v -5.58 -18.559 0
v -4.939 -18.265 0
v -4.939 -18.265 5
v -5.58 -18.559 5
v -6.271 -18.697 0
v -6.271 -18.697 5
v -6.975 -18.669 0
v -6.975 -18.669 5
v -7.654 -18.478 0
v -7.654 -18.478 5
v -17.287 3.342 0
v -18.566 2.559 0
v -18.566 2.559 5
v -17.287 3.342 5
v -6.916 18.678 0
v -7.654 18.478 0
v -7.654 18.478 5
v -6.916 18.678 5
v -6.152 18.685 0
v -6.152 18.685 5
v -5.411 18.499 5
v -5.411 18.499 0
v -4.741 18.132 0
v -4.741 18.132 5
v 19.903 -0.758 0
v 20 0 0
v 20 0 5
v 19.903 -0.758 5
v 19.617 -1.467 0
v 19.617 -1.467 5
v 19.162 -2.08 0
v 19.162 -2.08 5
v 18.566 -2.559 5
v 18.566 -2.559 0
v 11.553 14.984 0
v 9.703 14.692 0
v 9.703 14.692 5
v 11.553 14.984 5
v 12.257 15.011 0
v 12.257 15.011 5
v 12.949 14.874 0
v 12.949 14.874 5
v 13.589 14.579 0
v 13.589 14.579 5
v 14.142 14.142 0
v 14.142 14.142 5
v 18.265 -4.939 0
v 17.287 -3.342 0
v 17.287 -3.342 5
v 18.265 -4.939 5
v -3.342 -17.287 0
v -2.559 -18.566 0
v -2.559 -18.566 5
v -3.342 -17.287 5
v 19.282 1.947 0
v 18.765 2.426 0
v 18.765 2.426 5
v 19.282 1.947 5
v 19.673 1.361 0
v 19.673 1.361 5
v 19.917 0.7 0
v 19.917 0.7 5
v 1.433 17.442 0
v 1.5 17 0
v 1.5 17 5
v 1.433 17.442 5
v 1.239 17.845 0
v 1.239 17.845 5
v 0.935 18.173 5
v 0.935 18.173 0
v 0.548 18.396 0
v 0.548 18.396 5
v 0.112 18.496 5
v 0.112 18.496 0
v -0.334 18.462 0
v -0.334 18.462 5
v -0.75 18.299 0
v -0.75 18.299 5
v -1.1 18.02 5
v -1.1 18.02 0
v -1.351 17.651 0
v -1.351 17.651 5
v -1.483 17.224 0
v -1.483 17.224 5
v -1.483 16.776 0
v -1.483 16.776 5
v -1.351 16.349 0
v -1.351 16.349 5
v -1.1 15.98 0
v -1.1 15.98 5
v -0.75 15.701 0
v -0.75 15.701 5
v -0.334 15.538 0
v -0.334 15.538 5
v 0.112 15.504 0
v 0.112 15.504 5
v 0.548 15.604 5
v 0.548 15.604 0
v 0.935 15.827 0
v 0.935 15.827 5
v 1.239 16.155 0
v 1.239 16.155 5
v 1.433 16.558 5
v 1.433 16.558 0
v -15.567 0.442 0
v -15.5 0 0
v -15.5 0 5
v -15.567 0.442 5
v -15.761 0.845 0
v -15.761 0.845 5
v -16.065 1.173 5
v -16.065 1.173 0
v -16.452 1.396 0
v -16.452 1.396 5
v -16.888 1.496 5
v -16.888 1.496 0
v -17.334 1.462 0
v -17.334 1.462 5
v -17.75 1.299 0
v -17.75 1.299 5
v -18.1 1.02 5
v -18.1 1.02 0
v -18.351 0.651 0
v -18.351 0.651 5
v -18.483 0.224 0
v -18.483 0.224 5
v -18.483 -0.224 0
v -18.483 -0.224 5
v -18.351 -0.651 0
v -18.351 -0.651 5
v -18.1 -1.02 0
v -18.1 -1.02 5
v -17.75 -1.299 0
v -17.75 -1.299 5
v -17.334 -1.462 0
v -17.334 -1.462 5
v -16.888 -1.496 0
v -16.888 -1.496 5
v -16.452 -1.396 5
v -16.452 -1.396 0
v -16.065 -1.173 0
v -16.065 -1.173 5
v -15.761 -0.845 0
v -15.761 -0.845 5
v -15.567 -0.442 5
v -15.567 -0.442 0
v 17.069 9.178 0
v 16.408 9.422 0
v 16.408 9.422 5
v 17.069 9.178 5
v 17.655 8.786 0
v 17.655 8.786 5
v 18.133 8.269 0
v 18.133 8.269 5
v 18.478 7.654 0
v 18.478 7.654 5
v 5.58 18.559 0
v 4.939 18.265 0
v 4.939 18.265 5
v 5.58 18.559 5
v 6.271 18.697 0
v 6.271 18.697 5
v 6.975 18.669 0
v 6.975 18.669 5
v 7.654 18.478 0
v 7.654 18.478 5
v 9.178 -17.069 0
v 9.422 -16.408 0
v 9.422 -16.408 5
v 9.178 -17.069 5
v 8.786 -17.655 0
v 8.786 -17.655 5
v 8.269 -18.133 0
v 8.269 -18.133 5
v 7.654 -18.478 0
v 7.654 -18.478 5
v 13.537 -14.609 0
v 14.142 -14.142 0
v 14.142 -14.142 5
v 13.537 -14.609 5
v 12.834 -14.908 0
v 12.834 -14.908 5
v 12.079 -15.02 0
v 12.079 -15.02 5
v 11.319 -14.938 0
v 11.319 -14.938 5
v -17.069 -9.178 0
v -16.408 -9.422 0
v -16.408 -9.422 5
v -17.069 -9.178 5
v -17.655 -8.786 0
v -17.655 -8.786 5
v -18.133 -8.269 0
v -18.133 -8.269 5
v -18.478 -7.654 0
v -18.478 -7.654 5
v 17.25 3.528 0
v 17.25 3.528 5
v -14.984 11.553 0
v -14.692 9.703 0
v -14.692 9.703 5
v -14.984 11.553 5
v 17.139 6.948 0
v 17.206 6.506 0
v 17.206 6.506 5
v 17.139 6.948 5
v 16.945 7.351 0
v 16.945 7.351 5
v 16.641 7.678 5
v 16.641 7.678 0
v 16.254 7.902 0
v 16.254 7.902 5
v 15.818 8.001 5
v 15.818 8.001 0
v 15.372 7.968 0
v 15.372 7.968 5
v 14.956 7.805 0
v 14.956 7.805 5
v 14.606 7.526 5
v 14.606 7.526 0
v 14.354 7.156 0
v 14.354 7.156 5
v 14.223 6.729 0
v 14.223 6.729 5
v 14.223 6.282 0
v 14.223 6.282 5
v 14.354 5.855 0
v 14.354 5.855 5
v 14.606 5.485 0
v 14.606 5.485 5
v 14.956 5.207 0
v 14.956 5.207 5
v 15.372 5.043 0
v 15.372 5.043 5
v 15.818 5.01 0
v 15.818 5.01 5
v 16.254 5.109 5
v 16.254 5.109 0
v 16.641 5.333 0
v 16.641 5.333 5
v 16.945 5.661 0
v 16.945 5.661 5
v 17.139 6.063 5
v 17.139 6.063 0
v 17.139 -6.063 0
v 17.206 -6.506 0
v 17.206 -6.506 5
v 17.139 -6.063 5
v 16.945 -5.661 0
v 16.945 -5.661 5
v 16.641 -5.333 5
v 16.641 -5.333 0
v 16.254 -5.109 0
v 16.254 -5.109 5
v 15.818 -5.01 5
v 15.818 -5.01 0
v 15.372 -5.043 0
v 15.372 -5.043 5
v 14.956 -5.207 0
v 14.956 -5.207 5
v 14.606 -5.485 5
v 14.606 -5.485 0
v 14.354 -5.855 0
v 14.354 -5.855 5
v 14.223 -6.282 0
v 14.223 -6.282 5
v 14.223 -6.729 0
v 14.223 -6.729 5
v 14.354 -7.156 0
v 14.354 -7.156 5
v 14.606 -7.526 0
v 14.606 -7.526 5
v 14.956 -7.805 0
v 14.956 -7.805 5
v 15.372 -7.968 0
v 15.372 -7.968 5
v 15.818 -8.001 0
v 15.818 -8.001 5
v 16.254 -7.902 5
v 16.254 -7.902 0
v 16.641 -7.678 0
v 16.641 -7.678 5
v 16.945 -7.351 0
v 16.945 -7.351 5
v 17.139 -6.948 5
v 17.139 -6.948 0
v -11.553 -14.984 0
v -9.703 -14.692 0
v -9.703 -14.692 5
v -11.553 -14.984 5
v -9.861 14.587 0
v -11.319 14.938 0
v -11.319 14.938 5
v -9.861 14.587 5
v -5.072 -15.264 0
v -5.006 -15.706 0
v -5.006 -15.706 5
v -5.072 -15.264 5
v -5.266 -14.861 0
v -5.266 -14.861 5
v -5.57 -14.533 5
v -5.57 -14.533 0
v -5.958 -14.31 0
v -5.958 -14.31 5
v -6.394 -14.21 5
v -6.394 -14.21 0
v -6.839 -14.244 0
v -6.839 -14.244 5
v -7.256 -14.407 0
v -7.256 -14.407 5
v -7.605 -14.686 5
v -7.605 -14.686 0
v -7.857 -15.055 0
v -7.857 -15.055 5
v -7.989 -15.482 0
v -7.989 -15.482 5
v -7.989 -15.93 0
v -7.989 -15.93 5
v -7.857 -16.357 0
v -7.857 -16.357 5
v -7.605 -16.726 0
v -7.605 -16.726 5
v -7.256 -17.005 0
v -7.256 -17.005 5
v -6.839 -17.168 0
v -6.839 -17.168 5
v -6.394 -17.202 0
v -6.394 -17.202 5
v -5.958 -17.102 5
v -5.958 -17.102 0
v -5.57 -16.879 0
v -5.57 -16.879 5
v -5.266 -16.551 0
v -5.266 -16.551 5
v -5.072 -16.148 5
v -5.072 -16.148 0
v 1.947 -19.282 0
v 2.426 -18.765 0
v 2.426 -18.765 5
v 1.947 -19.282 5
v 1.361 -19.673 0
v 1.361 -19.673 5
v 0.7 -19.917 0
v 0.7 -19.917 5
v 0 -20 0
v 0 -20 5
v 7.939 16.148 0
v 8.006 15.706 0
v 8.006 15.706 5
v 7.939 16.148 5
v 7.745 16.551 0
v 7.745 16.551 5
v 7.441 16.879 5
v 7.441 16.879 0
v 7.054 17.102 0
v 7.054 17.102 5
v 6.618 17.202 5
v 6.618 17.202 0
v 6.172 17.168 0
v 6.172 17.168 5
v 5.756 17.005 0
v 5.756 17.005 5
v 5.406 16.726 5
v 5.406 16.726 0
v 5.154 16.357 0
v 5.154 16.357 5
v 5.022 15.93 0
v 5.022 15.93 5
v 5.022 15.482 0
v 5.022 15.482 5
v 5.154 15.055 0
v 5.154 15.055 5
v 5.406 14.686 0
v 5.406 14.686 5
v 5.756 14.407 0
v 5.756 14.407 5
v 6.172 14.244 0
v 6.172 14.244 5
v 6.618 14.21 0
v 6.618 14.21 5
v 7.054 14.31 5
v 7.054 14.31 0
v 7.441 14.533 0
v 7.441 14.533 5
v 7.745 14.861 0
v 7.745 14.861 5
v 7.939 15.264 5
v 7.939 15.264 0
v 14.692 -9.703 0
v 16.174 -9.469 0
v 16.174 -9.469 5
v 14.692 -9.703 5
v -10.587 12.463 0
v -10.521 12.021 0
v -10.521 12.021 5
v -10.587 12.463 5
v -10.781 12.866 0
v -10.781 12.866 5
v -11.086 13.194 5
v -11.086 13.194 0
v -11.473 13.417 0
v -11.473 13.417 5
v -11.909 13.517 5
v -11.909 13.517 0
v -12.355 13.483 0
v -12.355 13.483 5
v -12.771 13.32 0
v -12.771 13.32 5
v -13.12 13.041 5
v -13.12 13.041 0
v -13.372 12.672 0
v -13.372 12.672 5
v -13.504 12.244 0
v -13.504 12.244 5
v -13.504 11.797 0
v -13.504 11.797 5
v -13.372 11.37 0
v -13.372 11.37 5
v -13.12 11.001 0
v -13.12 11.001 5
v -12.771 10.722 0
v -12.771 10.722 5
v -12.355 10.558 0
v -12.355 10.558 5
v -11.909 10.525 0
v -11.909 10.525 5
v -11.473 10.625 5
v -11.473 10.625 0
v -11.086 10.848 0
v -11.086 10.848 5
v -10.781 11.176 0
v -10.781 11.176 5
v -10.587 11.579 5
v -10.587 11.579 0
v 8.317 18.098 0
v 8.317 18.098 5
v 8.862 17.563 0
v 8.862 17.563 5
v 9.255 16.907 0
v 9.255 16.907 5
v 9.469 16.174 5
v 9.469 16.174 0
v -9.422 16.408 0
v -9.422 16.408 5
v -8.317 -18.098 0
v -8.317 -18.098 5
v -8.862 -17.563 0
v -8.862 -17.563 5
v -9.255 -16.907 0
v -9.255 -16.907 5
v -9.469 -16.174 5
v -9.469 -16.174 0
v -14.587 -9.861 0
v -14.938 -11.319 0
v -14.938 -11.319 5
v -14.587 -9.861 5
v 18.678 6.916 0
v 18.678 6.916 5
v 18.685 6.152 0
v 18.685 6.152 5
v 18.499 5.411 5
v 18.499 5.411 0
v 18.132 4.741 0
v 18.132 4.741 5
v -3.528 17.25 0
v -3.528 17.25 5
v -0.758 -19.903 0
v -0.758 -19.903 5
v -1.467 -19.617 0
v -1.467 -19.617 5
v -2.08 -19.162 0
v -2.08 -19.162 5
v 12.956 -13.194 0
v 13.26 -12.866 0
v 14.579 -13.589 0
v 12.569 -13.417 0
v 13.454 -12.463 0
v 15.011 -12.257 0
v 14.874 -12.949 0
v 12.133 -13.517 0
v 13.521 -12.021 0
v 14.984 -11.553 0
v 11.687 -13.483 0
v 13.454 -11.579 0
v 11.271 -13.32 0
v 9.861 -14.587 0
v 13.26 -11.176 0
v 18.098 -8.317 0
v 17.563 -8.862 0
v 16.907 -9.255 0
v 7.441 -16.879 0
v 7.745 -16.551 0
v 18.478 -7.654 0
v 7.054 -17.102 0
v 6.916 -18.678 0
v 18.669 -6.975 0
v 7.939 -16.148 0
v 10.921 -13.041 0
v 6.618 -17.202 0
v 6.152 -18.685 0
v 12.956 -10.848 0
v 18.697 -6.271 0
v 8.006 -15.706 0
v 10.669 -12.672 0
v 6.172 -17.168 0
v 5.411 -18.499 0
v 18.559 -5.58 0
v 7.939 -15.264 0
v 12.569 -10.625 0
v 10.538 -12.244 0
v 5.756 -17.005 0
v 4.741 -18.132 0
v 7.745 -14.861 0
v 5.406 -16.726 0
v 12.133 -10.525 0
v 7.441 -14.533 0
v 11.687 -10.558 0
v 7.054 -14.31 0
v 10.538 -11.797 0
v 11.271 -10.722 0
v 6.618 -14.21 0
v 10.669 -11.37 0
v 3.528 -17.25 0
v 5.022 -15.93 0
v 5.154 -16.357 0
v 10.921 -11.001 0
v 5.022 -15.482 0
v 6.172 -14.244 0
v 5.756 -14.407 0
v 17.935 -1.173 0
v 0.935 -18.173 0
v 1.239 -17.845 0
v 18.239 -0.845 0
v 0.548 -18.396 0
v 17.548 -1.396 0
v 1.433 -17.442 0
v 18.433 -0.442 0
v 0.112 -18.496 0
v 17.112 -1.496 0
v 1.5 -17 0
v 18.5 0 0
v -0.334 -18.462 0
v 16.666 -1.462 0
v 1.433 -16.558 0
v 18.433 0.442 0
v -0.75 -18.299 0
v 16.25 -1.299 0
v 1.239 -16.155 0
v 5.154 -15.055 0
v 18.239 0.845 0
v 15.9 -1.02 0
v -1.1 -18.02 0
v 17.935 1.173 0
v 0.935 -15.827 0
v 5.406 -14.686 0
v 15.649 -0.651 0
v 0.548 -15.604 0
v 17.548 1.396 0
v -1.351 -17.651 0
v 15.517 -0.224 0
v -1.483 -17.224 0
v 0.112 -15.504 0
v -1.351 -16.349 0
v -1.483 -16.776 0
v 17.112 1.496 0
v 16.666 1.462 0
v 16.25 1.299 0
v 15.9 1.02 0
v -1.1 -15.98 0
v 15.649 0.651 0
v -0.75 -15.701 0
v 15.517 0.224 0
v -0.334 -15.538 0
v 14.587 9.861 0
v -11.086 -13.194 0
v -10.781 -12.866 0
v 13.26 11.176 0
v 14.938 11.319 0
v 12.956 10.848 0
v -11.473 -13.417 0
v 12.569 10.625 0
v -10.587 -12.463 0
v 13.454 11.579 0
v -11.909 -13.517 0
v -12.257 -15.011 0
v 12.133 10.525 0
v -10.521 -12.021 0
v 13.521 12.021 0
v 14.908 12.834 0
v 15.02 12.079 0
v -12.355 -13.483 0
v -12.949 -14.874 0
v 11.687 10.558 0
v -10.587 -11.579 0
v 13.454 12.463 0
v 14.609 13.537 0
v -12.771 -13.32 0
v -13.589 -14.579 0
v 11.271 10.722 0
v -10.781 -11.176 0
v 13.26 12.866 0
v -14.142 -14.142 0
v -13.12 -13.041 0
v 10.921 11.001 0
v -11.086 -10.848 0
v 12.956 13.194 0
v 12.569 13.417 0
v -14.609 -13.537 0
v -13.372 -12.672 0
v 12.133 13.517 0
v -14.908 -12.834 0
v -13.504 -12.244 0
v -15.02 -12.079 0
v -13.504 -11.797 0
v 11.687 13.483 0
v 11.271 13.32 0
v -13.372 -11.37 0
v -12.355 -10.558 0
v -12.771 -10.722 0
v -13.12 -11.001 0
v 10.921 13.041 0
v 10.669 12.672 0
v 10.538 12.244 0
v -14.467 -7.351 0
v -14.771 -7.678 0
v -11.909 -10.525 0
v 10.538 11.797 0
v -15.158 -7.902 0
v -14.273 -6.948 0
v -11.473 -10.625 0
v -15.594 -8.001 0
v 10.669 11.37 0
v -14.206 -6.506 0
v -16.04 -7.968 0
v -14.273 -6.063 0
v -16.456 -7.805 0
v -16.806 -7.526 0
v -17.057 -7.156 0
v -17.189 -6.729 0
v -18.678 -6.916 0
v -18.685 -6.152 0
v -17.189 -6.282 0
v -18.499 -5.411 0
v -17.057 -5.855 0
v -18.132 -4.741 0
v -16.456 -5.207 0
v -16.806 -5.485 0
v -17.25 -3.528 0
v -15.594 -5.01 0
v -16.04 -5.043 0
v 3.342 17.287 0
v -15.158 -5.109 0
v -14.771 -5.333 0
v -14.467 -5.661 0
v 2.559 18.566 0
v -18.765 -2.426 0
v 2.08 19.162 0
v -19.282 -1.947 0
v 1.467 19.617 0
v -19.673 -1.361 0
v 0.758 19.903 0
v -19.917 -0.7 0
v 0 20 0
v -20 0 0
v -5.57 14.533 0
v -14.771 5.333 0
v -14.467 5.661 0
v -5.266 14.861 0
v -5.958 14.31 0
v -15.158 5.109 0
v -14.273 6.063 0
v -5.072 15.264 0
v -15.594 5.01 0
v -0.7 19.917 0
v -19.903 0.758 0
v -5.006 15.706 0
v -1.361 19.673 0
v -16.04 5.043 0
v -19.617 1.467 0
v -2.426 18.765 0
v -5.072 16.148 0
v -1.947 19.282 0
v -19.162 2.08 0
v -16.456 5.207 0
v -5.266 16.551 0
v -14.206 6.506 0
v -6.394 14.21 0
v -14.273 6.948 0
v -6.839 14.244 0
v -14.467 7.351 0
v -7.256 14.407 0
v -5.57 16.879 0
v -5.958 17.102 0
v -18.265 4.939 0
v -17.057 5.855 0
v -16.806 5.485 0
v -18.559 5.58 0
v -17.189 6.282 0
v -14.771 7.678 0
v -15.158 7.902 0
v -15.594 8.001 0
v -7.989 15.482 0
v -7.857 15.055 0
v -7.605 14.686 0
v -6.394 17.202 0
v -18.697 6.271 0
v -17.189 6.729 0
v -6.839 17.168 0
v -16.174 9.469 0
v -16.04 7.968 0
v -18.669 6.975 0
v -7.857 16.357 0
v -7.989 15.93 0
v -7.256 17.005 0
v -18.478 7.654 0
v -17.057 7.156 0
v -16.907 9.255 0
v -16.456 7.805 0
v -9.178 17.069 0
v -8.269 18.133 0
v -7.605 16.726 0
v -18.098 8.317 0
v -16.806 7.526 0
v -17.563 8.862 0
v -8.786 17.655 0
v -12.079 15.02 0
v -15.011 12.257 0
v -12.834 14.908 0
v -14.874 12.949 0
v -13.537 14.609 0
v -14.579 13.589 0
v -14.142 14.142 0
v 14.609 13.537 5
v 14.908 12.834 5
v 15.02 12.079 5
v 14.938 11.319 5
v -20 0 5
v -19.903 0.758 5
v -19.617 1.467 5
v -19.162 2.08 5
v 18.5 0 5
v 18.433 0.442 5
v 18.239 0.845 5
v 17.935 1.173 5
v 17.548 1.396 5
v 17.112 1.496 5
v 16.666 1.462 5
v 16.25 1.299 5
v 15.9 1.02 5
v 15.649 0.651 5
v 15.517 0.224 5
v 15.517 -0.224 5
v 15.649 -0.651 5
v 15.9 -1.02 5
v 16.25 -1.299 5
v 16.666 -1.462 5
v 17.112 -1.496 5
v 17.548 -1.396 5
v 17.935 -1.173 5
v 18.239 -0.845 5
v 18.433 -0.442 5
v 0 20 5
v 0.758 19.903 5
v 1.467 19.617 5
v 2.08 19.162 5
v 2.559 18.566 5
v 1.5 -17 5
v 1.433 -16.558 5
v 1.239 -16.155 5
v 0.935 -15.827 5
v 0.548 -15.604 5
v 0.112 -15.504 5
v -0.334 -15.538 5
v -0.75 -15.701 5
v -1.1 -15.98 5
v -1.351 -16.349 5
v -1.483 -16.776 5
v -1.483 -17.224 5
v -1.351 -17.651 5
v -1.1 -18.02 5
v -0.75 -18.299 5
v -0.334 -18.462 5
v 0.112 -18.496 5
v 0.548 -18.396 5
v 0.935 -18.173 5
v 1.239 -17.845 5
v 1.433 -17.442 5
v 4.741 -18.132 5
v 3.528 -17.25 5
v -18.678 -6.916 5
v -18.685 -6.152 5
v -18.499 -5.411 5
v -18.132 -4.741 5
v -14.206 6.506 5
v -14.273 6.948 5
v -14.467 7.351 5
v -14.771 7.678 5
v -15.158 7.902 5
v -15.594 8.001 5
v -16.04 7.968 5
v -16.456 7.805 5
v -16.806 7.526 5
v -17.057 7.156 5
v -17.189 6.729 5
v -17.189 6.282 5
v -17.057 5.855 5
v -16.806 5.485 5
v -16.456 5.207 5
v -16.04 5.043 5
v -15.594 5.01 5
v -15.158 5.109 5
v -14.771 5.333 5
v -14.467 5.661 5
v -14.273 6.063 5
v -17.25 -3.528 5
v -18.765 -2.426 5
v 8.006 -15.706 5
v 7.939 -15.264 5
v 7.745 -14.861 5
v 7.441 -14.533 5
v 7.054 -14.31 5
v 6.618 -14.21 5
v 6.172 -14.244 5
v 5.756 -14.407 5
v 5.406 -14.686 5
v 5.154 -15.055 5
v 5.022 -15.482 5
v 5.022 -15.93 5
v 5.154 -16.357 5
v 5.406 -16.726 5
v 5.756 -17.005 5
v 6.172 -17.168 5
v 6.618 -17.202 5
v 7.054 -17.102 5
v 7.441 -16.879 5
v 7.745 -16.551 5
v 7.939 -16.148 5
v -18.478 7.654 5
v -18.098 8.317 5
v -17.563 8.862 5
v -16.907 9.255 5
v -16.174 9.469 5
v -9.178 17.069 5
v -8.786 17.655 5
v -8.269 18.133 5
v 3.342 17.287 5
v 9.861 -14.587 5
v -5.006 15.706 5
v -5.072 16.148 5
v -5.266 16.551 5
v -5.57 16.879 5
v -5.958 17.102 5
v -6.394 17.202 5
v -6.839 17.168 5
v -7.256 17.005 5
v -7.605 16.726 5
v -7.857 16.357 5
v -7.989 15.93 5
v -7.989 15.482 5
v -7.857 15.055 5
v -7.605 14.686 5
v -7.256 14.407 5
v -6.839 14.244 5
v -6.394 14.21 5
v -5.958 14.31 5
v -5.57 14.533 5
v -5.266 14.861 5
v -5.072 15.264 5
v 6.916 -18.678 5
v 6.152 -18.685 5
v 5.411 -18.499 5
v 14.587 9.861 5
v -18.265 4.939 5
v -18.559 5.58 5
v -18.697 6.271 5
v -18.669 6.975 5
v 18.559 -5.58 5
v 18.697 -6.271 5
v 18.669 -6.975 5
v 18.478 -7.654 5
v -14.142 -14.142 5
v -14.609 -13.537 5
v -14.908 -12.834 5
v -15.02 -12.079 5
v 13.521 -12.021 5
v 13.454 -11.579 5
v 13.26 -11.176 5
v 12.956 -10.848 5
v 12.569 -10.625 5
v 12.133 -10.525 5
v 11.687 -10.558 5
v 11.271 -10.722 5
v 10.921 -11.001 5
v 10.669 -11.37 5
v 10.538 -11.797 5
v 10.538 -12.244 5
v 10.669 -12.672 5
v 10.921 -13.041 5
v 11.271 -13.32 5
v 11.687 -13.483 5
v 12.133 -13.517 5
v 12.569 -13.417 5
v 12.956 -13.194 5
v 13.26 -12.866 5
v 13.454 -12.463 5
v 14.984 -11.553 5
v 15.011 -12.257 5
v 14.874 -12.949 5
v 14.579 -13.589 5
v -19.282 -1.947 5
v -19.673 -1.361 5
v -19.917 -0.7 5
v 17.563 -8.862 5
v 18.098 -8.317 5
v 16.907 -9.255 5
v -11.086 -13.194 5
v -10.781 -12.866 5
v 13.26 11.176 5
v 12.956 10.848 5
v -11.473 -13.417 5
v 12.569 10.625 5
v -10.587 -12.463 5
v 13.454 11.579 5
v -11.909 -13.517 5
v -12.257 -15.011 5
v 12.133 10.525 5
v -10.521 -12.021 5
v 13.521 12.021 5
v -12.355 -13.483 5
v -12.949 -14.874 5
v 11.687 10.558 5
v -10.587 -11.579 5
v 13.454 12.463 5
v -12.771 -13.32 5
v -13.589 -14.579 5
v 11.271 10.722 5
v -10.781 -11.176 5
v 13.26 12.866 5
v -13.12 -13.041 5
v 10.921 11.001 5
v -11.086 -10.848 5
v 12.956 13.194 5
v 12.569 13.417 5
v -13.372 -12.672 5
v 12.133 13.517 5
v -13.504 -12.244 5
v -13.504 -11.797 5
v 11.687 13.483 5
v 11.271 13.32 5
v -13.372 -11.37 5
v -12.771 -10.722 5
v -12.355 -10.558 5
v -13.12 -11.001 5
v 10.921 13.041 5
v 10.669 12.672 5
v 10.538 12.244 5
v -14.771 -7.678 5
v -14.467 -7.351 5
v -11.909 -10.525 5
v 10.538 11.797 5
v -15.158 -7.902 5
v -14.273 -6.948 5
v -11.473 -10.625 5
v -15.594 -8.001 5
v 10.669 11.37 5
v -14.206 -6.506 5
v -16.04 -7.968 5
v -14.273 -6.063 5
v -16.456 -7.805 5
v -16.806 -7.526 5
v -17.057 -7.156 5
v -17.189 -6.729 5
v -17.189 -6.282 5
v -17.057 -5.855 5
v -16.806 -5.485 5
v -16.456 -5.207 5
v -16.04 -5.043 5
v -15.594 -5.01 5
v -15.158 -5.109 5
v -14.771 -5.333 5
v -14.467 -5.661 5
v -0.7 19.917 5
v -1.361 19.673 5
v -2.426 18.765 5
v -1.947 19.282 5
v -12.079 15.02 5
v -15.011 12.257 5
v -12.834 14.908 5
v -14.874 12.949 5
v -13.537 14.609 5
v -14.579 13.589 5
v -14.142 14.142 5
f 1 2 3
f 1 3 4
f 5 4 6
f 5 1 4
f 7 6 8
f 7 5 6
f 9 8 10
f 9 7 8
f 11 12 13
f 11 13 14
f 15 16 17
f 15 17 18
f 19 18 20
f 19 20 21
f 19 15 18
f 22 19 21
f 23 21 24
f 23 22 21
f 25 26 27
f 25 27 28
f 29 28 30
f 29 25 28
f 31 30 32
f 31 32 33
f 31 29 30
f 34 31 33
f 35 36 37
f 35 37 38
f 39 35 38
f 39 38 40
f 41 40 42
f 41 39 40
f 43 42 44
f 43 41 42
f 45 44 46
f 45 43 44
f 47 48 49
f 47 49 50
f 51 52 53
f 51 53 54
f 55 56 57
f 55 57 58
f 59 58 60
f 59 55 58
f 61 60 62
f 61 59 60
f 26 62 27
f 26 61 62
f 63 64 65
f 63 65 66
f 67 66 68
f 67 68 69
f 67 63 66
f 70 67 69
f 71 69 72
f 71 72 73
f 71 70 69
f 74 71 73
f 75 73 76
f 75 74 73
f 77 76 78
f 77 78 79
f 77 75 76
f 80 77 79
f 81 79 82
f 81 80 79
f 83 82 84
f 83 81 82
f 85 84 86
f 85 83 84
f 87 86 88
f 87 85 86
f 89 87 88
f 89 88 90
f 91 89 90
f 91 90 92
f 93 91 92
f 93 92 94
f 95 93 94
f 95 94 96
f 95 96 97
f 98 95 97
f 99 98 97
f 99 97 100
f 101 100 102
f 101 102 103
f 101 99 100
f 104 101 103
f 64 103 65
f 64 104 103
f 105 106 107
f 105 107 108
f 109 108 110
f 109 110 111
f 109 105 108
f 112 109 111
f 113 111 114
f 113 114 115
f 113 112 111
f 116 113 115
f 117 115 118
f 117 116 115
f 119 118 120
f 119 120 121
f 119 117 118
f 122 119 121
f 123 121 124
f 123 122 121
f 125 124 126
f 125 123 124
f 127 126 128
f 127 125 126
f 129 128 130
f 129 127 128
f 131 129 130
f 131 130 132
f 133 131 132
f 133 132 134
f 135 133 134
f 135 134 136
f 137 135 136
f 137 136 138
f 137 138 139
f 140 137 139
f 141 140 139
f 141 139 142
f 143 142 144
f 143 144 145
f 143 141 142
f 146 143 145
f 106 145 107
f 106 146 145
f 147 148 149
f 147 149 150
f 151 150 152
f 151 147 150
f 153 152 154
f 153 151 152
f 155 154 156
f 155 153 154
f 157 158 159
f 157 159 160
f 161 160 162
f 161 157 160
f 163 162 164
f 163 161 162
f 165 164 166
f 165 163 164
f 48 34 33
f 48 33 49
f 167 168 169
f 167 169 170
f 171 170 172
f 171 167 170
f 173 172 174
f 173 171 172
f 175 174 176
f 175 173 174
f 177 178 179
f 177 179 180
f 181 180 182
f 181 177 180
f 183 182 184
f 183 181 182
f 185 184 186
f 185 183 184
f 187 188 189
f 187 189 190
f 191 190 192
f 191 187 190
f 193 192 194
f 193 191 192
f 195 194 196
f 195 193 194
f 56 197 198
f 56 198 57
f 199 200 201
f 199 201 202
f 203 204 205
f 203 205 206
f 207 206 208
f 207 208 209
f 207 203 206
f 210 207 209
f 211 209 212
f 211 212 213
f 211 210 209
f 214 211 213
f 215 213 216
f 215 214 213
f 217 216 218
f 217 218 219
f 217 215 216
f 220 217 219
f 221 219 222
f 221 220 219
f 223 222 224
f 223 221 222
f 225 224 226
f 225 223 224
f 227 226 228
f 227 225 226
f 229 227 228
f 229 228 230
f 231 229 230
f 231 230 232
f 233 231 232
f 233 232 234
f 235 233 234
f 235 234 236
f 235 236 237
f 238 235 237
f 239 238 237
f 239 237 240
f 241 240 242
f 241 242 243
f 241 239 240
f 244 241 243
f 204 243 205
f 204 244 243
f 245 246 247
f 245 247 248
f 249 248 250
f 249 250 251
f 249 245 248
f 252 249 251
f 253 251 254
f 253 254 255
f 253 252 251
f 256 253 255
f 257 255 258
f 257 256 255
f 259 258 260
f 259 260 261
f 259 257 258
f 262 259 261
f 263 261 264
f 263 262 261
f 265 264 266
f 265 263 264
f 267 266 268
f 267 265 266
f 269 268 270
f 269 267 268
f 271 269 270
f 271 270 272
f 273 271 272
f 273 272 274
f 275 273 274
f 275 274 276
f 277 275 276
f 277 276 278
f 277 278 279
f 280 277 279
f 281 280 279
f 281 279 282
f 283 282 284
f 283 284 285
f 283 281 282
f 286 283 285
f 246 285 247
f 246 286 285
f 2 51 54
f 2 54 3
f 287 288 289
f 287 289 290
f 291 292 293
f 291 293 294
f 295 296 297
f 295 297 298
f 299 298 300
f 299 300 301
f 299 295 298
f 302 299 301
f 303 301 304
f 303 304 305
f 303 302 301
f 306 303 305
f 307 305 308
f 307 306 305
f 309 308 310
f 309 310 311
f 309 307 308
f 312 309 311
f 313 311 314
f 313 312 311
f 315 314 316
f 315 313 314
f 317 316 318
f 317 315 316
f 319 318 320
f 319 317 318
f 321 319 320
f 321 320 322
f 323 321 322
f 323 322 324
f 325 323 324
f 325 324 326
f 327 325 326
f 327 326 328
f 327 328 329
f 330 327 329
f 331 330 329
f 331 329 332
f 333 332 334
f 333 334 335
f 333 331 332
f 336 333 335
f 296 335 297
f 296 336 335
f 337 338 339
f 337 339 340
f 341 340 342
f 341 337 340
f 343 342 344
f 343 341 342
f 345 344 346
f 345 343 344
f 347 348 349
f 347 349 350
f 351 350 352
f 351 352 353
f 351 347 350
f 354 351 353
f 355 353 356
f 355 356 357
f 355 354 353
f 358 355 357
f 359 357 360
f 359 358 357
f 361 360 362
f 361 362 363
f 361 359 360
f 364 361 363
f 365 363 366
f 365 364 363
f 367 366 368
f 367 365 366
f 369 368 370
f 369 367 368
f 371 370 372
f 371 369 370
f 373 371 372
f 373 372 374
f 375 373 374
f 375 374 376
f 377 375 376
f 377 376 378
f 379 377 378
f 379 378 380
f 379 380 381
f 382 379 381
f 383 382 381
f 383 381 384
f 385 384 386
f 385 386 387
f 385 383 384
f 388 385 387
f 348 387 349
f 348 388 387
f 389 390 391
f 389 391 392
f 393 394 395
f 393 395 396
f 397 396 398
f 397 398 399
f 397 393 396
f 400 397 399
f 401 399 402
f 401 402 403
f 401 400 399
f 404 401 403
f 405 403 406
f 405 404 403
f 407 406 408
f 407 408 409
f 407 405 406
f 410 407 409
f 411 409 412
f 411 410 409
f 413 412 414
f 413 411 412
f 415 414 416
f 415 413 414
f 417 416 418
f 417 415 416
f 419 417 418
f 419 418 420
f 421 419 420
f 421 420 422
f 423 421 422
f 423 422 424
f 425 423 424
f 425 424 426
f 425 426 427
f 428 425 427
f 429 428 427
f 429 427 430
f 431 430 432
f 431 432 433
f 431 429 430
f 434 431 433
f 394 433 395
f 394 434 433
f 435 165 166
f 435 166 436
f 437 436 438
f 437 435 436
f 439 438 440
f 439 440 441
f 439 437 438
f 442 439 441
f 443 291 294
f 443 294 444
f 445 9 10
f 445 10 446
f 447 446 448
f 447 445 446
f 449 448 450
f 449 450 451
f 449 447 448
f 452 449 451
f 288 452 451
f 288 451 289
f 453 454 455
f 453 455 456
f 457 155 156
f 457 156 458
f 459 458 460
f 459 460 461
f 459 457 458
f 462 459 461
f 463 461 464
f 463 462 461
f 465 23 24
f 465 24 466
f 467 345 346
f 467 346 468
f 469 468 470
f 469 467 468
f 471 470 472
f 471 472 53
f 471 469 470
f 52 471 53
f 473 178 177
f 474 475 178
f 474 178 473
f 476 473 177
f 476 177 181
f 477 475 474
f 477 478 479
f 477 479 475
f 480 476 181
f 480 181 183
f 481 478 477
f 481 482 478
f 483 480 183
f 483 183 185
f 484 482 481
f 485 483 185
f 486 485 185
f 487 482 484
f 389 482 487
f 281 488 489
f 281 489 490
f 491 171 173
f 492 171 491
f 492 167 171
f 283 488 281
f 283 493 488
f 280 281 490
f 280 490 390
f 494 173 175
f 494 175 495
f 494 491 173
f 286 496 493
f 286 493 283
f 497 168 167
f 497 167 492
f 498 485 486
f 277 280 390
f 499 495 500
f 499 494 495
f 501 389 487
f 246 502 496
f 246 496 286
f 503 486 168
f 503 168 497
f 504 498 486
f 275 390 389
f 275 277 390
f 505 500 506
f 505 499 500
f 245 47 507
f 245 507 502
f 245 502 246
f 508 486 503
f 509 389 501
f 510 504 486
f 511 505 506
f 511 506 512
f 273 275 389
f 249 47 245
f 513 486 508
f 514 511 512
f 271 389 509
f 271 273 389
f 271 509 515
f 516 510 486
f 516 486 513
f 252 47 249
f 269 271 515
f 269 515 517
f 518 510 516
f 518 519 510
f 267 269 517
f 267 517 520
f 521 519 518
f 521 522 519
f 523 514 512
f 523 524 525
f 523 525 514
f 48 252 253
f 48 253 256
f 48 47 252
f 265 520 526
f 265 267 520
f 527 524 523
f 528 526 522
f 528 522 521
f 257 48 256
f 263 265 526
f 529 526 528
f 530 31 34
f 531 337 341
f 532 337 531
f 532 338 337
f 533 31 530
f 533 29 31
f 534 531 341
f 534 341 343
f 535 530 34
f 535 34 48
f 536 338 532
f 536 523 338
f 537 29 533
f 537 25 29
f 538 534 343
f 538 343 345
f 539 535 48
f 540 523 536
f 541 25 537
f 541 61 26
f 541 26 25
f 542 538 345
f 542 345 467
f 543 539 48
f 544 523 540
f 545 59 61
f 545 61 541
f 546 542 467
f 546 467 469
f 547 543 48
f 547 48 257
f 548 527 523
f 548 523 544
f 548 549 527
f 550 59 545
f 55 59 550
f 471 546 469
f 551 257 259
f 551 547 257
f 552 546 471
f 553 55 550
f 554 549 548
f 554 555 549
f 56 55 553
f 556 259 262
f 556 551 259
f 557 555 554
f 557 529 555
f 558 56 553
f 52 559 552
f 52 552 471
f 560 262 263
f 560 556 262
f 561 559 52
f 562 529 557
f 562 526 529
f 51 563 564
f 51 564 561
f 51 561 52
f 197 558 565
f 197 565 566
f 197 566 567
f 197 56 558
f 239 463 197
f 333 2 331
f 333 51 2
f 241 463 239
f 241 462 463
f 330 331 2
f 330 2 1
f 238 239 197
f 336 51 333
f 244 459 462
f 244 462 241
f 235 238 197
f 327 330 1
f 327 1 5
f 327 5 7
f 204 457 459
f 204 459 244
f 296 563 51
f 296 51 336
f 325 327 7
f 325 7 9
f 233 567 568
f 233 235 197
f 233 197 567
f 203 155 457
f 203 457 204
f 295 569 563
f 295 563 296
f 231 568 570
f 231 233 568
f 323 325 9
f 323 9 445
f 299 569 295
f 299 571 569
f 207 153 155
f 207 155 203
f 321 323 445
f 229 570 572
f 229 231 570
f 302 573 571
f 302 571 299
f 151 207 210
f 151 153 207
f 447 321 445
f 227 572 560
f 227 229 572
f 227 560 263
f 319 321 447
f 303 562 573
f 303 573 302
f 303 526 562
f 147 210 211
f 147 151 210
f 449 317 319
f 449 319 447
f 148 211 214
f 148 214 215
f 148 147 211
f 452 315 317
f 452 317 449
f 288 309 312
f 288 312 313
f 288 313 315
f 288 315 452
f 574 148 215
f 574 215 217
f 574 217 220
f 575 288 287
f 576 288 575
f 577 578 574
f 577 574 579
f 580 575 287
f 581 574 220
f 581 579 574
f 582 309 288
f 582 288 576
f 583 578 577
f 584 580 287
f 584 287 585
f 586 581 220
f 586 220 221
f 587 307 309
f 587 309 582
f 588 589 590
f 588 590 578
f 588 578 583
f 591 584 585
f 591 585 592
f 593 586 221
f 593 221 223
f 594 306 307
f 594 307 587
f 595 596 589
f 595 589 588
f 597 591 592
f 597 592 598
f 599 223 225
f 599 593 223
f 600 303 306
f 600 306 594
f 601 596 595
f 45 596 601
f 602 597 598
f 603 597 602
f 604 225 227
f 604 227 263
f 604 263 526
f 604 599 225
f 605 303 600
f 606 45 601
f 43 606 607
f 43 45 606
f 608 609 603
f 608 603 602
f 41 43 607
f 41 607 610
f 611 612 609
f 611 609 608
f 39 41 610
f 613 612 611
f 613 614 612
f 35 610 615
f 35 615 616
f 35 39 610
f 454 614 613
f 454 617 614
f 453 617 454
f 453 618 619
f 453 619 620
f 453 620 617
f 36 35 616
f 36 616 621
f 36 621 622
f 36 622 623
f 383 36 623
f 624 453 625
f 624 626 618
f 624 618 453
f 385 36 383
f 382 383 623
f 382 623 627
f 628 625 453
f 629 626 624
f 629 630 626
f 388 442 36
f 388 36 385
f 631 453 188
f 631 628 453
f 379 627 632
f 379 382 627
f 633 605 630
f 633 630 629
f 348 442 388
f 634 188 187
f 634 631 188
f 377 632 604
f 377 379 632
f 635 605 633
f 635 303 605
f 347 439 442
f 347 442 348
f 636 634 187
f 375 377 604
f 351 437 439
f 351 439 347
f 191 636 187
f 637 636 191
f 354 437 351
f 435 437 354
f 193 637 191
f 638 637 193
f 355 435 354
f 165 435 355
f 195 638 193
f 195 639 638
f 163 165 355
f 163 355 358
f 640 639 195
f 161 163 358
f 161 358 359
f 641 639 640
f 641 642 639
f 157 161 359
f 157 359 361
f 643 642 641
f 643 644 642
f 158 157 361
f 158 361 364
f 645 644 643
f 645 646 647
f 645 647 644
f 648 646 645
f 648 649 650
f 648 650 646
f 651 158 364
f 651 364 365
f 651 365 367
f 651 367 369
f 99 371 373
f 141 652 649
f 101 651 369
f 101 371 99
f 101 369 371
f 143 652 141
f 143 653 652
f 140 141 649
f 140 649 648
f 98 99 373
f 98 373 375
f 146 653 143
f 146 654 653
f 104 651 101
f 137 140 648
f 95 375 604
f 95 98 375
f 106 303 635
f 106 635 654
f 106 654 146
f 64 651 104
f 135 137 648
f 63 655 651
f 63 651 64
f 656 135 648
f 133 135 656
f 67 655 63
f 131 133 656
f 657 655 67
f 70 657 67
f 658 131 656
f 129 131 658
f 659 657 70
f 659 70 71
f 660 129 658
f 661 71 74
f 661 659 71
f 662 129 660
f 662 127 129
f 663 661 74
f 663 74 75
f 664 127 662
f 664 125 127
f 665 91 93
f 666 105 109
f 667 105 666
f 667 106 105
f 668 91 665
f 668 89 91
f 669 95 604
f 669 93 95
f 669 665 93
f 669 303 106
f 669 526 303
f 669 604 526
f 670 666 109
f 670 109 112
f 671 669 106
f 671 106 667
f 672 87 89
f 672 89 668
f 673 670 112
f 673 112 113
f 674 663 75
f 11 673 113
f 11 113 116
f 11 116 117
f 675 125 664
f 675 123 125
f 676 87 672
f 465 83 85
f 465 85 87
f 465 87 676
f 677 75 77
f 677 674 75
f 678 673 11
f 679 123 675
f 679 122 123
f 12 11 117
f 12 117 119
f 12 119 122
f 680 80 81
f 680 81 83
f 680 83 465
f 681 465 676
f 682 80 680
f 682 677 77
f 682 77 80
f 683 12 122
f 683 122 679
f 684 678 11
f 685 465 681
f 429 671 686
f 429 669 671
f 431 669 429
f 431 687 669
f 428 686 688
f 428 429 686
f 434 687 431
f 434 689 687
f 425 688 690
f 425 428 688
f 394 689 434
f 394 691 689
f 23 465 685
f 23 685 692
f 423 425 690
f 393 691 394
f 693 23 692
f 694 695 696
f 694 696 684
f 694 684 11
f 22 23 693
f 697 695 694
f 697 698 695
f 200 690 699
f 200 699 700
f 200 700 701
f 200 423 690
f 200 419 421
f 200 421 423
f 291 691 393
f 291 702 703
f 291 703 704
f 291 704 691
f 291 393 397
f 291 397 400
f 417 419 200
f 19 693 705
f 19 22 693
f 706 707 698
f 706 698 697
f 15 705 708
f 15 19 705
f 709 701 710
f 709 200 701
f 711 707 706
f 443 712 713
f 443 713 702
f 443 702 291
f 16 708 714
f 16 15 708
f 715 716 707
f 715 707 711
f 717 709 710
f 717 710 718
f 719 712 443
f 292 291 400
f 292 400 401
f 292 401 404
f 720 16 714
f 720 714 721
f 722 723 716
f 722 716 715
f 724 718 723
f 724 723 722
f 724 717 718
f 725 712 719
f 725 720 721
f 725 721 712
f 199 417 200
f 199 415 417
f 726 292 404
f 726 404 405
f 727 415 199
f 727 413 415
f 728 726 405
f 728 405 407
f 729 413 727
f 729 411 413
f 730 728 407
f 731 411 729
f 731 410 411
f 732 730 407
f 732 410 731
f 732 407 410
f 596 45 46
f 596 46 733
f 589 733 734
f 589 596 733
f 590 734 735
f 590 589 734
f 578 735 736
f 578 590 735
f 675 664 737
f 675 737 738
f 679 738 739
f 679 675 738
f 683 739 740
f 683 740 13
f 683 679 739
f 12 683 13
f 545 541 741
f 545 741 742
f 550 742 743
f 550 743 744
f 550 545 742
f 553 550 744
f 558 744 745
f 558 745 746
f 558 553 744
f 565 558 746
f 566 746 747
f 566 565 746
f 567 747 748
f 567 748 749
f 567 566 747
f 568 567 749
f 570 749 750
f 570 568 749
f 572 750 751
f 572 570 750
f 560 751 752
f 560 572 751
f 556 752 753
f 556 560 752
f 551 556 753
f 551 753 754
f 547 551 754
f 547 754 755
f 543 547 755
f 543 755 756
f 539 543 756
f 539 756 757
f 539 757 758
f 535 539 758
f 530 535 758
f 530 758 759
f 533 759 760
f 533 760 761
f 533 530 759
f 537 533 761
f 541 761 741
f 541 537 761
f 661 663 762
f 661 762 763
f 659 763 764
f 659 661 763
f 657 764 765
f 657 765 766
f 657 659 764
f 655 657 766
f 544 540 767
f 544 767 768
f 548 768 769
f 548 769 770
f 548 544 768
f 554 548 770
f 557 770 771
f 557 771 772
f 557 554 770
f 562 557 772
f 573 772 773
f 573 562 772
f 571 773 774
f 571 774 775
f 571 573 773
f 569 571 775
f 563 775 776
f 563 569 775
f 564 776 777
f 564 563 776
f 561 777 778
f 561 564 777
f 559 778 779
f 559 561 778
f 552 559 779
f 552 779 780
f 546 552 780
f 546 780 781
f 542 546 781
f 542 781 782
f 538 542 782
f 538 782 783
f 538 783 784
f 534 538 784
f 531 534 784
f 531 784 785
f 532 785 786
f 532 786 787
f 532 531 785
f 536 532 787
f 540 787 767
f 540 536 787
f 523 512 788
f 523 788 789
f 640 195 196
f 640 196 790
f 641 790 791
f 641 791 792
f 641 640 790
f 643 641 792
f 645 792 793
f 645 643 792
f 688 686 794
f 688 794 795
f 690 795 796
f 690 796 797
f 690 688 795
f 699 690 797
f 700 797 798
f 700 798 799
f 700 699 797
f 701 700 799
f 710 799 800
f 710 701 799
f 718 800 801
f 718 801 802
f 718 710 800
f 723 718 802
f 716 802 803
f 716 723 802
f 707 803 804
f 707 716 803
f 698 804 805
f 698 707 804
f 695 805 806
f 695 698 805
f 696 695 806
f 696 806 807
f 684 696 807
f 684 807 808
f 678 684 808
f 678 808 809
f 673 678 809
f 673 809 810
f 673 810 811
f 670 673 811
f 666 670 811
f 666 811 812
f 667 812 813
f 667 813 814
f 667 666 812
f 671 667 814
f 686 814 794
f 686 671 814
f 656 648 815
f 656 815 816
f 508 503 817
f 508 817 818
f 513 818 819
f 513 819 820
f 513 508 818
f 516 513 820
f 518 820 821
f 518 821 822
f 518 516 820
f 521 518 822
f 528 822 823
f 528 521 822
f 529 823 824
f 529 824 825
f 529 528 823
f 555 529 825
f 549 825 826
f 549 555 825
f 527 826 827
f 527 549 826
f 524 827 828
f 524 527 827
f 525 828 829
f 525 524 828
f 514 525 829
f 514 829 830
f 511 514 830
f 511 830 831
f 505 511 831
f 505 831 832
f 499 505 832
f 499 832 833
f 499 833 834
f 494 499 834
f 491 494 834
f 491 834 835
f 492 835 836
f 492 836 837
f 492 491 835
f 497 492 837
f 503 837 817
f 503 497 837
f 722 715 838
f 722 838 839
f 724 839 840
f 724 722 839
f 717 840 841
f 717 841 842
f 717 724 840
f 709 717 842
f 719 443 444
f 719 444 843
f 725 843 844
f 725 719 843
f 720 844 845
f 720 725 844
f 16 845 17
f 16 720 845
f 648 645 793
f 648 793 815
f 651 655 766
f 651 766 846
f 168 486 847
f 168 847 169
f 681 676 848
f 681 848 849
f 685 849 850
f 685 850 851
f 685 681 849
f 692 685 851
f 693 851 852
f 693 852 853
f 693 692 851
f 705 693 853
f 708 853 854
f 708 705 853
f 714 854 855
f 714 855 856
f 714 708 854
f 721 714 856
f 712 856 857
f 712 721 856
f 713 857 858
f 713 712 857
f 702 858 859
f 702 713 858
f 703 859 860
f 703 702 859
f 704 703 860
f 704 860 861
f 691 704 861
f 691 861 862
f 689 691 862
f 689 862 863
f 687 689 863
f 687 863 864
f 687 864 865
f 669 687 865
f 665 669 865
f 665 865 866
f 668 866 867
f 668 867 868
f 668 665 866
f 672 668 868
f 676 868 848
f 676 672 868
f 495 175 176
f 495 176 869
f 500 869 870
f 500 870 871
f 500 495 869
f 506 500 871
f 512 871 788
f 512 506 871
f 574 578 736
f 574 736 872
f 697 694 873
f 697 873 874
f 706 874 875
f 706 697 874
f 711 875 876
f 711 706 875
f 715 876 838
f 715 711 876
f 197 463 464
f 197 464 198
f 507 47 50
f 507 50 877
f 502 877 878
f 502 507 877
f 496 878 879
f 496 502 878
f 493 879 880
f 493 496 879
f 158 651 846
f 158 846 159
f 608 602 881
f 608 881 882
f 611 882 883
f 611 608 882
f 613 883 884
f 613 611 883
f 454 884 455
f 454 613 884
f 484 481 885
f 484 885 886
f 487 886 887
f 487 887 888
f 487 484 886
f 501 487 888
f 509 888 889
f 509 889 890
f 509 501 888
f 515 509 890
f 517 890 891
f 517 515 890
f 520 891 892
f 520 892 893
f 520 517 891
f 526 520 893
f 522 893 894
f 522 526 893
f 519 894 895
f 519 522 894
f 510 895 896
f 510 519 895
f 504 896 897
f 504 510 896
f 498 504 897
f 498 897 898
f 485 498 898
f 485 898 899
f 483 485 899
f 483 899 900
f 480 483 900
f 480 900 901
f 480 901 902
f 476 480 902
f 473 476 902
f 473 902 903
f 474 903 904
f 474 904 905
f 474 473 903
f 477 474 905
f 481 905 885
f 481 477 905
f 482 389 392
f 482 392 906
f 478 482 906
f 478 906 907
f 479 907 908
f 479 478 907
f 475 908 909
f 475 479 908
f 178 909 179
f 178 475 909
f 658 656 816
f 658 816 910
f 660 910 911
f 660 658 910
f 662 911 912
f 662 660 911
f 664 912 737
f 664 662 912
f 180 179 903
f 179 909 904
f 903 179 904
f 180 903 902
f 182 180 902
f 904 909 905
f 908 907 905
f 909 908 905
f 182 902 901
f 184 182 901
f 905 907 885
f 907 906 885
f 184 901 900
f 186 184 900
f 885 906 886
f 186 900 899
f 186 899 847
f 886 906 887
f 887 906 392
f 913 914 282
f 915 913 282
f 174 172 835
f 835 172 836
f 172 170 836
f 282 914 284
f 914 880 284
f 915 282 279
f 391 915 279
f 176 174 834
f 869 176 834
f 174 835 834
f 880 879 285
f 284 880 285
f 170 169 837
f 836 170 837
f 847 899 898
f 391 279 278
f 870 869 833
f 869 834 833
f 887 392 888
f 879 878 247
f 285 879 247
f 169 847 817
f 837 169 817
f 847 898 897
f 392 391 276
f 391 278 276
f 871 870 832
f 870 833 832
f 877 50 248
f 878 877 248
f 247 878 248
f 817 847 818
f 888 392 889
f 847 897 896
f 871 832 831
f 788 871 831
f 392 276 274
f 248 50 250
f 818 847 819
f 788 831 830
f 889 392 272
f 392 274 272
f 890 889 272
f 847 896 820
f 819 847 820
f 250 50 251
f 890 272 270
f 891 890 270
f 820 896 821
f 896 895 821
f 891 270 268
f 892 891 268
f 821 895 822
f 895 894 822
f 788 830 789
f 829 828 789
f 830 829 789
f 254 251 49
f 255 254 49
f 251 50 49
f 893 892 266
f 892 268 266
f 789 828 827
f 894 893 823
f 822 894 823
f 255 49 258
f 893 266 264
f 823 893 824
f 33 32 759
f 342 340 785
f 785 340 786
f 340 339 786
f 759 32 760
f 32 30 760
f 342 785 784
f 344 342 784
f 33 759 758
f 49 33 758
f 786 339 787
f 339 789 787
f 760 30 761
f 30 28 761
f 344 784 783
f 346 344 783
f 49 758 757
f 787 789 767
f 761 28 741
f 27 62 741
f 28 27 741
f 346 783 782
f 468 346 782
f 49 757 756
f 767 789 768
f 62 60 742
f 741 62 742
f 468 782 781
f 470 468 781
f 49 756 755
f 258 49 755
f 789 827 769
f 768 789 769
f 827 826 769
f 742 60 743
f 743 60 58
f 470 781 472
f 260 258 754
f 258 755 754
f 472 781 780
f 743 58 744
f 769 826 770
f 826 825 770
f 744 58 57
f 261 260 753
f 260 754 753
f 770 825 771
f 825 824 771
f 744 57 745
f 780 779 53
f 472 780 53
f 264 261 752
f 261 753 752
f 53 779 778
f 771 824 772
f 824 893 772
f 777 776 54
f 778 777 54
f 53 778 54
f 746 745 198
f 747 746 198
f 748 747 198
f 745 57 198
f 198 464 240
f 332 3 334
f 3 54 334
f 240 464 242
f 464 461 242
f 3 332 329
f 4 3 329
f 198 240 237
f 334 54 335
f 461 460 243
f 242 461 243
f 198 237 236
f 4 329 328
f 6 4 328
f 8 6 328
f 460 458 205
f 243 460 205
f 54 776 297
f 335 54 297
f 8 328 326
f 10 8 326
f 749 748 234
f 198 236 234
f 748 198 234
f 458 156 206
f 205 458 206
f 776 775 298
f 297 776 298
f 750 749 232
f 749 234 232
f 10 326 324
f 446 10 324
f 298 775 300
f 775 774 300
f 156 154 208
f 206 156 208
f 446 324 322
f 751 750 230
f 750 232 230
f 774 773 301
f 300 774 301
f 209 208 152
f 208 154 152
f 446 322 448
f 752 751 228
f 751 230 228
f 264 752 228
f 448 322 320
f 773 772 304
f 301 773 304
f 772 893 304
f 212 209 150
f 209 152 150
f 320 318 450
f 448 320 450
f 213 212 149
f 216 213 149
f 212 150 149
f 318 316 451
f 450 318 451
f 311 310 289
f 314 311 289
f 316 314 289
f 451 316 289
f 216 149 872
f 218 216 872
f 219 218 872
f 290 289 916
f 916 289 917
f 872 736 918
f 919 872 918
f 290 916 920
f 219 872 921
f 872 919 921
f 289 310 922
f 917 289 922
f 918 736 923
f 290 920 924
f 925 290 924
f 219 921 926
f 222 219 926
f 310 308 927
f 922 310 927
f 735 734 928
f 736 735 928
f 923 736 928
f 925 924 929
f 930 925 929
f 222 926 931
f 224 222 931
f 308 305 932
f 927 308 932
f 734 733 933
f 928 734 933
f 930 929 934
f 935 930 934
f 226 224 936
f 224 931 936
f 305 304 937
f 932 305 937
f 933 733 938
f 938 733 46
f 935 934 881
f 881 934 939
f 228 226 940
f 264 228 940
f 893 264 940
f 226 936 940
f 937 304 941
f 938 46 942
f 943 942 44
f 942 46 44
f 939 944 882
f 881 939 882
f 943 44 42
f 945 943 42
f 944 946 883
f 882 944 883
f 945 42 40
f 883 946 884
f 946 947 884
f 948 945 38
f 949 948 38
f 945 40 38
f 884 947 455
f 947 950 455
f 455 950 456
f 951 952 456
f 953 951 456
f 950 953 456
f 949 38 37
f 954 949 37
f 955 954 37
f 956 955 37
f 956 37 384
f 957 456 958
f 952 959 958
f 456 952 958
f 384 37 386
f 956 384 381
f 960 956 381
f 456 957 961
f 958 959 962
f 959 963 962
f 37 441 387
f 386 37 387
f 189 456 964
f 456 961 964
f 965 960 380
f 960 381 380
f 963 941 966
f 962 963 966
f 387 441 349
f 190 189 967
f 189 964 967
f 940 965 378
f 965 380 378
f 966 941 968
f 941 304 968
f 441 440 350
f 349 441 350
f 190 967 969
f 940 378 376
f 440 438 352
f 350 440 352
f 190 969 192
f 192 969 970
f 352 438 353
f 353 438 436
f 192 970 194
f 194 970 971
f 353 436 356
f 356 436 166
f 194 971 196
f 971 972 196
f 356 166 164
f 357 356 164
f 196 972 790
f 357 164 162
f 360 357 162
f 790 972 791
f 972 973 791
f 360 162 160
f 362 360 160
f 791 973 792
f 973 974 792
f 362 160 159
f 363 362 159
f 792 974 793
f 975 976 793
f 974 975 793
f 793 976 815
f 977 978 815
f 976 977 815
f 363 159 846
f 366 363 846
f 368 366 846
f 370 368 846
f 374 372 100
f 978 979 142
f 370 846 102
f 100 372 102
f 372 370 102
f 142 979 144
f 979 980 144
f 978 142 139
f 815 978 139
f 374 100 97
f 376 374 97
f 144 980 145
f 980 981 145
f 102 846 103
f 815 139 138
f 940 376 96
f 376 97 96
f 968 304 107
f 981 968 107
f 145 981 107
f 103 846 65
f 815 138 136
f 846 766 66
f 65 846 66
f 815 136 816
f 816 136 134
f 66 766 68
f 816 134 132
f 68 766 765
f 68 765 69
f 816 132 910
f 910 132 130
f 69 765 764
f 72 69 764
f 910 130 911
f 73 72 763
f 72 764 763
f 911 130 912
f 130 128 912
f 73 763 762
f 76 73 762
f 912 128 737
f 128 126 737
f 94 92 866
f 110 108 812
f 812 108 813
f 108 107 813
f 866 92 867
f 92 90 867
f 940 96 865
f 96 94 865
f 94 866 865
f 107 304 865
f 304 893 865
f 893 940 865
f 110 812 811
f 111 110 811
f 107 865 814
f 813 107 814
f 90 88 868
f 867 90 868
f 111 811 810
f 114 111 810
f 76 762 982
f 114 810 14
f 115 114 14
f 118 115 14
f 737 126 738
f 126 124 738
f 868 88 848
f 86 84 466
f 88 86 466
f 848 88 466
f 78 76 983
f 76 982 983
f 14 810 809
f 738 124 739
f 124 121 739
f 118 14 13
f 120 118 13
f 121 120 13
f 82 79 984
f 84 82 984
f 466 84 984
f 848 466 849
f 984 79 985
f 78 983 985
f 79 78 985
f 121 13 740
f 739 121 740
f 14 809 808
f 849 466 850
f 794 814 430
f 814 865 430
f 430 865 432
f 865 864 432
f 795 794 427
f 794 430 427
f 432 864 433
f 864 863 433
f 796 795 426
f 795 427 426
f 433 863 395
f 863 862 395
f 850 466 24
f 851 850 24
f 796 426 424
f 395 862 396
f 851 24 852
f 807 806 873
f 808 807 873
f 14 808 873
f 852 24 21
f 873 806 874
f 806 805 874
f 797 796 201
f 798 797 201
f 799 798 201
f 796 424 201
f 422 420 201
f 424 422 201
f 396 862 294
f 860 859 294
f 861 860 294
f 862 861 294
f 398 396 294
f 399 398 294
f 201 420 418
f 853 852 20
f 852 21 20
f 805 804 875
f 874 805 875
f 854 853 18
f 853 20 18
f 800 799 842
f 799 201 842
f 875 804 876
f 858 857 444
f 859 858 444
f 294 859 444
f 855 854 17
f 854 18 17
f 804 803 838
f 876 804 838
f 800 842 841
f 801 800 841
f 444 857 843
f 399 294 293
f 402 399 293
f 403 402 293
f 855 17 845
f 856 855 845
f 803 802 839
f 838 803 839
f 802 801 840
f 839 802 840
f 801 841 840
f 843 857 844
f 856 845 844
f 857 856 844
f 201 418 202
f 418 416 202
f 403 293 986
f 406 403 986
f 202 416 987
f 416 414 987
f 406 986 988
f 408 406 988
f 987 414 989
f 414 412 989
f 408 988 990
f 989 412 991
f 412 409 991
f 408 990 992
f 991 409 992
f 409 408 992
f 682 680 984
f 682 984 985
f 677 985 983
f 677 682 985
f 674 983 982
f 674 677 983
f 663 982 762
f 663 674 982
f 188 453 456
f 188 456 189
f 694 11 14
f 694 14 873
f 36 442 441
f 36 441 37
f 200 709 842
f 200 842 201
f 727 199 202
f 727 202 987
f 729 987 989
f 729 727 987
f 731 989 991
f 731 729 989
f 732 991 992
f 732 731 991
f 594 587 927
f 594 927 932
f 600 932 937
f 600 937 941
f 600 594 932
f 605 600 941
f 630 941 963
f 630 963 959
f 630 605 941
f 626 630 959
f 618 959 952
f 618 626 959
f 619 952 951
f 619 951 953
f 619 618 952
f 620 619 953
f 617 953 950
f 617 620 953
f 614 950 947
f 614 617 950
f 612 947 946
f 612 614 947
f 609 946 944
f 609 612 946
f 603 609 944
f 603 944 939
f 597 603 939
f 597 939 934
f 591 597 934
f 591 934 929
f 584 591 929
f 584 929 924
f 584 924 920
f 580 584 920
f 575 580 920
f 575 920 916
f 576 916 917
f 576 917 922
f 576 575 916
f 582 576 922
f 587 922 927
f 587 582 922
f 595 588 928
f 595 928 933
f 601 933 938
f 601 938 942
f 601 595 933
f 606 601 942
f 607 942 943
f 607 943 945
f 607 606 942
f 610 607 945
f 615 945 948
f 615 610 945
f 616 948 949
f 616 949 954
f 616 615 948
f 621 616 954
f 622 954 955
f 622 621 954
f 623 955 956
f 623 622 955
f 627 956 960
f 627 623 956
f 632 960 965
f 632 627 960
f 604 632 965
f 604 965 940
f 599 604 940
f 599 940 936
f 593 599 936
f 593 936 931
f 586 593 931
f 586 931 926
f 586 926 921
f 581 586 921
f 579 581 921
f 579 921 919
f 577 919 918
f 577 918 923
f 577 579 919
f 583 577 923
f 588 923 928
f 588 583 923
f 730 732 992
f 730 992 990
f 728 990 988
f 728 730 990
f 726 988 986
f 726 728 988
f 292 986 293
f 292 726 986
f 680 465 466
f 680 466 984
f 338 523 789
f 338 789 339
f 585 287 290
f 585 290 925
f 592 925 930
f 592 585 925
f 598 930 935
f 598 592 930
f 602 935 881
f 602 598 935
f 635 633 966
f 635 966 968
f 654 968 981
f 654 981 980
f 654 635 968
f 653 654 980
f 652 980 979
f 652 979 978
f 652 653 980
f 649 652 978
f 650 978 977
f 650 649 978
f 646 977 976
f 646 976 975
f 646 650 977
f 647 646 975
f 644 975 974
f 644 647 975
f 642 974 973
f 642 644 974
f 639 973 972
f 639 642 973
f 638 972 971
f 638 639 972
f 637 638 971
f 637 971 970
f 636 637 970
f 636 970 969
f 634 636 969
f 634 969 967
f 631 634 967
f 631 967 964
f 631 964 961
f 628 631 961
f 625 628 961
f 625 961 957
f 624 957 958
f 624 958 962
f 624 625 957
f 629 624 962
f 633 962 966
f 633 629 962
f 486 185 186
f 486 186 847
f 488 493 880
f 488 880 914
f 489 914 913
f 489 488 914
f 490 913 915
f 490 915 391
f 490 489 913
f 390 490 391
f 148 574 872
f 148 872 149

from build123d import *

# Parameters (mm, degrees)
SKETCH1_R           = 1.5
BOSS_EXTRUDE1_DEPTH = 5


with BuildPart() as part:
    # Sketch1 → Boss-Extrude1 (new body)
    with BuildSketch(Plane.XY):
        with BuildLine():
            Line((3.341817931, 17.286797691), (4.939453025, 18.264687321))
            ThreePointArc((4.939453025, 18.264687321), (6.271018689, 18.696765153), (7.653668647, 18.47759065))
            ThreePointArc((7.653668647, 18.47759065), (8.86205197, 17.562621273), (9.468927016, 16.173714546))
            Line((9.468927016, 16.173714546), (9.702808263, 14.692060213))
            Line((9.702808263, 14.692060213), (11.553052787, 14.984123946))
            ThreePointArc((11.553052787, 14.984123946), (12.948608078, 14.873743692), (14.142135624, 14.142135624))
            ThreePointArc((14.142135624, 14.142135624), (14.908392622, 12.834385865), (14.937560462, 11.318962342))
            Line((14.937560462, 11.318962342), (14.586633993, 9.860589752))
            Line((14.586633993, 9.860589752), (16.407804991, 9.422363532))
            ThreePointArc((16.407804991, 9.422363532), (17.654889266, 8.786329586), (18.47759065, 7.653668647))
            ThreePointArc((18.47759065, 7.653668647), (18.685065641, 6.152231554), (18.132085736, 4.741000729))
            Line((18.132085736, 4.741000729), (17.249776925, 3.527933887))
            Line((17.249776925, 3.527933887), (18.764617622, 2.426133683))
            ThreePointArc((18.764617622, 2.426133683), (19.673373605, 1.361276448), (20, 0))
            ThreePointArc((20, 0), (19.617106797, -1.466544242), (18.566165325, -2.558735269))
            Line((18.566165325, -2.558735269), (17.286797691, -3.341817931))
            Line((17.286797691, -3.341817931), (18.264687321, -4.939453025))
            ThreePointArc((18.264687321, -4.939453025), (18.696765153, -6.271018689), (18.47759065, -7.653668647))
            ThreePointArc((18.47759065, -7.653668647), (17.562621273, -8.86205197), (16.173714546, -9.468927016))
            Line((16.173714546, -9.468927016), (14.692060213, -9.702808263))
            Line((14.692060213, -9.702808263), (14.984123946, -11.553052787))
            ThreePointArc((14.984123946, -11.553052787), (14.873743692, -12.948608078), (14.142135624, -14.142135624))
            ThreePointArc((14.142135624, -14.142135624), (12.834385865, -14.908392622), (11.318962342, -14.937560462))
            Line((11.318962342, -14.937560462), (9.860589752, -14.586633993))
            Line((9.860589752, -14.586633993), (9.422363532, -16.407804991))
            ThreePointArc((9.422363532, -16.407804991), (8.786329586, -17.654889266), (7.653668647, -18.47759065))
            ThreePointArc((7.653668647, -18.47759065), (6.152231554, -18.685065641), (4.741000729, -18.132085736))
            Line((4.741000729, -18.132085736), (3.527933887, -17.249776925))
            Line((3.527933887, -17.249776925), (2.426133683, -18.764617622))
            ThreePointArc((2.426133683, -18.764617622), (1.361276448, -19.673373605), (0, -20))
            ThreePointArc((0, -20), (-1.466544242, -19.617106797), (-2.558735269, -18.566165325))
            Line((-2.558735269, -18.566165325), (-3.341817931, -17.286797691))
            Line((-3.341817931, -17.286797691), (-4.939453025, -18.264687321))
            ThreePointArc((-4.939453025, -18.264687321), (-6.271018689, -18.696765153), (-7.653668647, -18.47759065))
            ThreePointArc((-7.653668647, -18.47759065), (-8.86205197, -17.562621273), (-9.468927016, -16.173714546))
            Line((-9.468927016, -16.173714546), (-9.702808263, -14.692060213))
            Line((-9.702808263, -14.692060213), (-11.553052787, -14.984123946))
            ThreePointArc((-11.553052787, -14.984123946), (-12.948608078, -14.873743692), (-14.142135624, -14.142135624))
            ThreePointArc((-14.142135624, -14.142135624), (-14.908392622, -12.834385865), (-14.937560462, -11.318962342))
            Line((-14.937560462, -11.318962342), (-14.586633993, -9.860589752))
            Line((-14.586633993, -9.860589752), (-16.407804991, -9.422363532))
            ThreePointArc((-16.407804991, -9.422363532), (-17.654889266, -8.786329586), (-18.47759065, -7.653668647))
            ThreePointArc((-18.47759065, -7.653668647), (-18.685065641, -6.152231554), (-18.132085736, -4.741000729))
            Line((-18.132085736, -4.741000729), (-17.249776925, -3.527933887))
            Line((-17.249776925, -3.527933887), (-18.764617622, -2.426133683))
            ThreePointArc((-18.764617622, -2.426133683), (-19.673373605, -1.361276448), (-20, 0))
            ThreePointArc((-20, 0), (-19.617106797, 1.466544242), (-18.566165325, 2.558735269))
            Line((-18.566165325, 2.558735269), (-17.286797691, 3.341817931))
            Line((-17.286797691, 3.341817931), (-18.264687321, 4.939453025))
            ThreePointArc((-18.264687321, 4.939453025), (-18.696765153, 6.271018689), (-18.47759065, 7.653668647))
            ThreePointArc((-18.47759065, 7.653668647), (-17.562621273, 8.86205197), (-16.173714546, 9.468927016))
            Line((-16.173714546, 9.468927016), (-14.692060213, 9.702808263))
            Line((-14.692060213, 9.702808263), (-14.984123946, 11.553052787))
            ThreePointArc((-14.984123946, 11.553052787), (-14.873743692, 12.948608078), (-14.142135624, 14.142135624))
            ThreePointArc((-14.142135624, 14.142135624), (-12.834385865, 14.908392622), (-11.318962342, 14.937560462))
            Line((-11.318962342, 14.937560462), (-9.860589752, 14.586633993))
            Line((-9.860589752, 14.586633993), (-9.422363532, 16.407804991))
            ThreePointArc((-9.422363532, 16.407804991), (-8.786329586, 17.654889266), (-7.653668647, 18.47759065))
            ThreePointArc((-7.653668647, 18.47759065), (-6.152231554, 18.685065641), (-4.741000729, 18.132085736))
            Line((-4.741000729, 18.132085736), (-3.527933887, 17.249776925))
            Line((-3.527933887, 17.249776925), (-2.426133683, 18.764617622))
            ThreePointArc((-2.426133683, 18.764617622), (-1.361276448, 19.673373605), (0, 20))
            ThreePointArc((0, 20), (1.466544242, 19.617106797), (2.558735269, 18.566165325))
            Line((2.558735269, 18.566165325), (3.341817931, 17.286797691))
        make_face()
        with Locations((0, 17)):
            Circle(SKETCH1_R, mode=Mode.SUBTRACT)
        with Locations((6.50561835, 15.705952053)):
            Circle(SKETCH1_R, mode=Mode.SUBTRACT)
        with Locations((12.02081528, 12.02081528)):
            Circle(SKETCH1_R, mode=Mode.SUBTRACT)
        with Locations((15.705952053, 6.50561835)):
            Circle(SKETCH1_R, mode=Mode.SUBTRACT)
        with Locations((17, 0)):
            Circle(SKETCH1_R, mode=Mode.SUBTRACT)
        with Locations((15.705952053, -6.50561835)):
            Circle(SKETCH1_R, mode=Mode.SUBTRACT)
        with Locations((12.02081528, -12.02081528)):
            Circle(SKETCH1_R, mode=Mode.SUBTRACT)
        with Locations((6.50561835, -15.705952053)):
            Circle(SKETCH1_R, mode=Mode.SUBTRACT)
        with Locations((0, -17)):
            Circle(SKETCH1_R, mode=Mode.SUBTRACT)
        with Locations((-6.50561835, -15.705952053)):
            Circle(SKETCH1_R, mode=Mode.SUBTRACT)
        with Locations((-12.02081528, -12.02081528)):
            Circle(SKETCH1_R, mode=Mode.SUBTRACT)
        with Locations((-15.705952053, -6.50561835)):
            Circle(SKETCH1_R, mode=Mode.SUBTRACT)
        with Locations((-17, 0)):
            Circle(SKETCH1_R, mode=Mode.SUBTRACT)
        with Locations((-15.705952053, 6.50561835)):
            Circle(SKETCH1_R, mode=Mode.SUBTRACT)
        with Locations((-12.02081528, 12.02081528)):
            Circle(SKETCH1_R, mode=Mode.SUBTRACT)
        with Locations((-6.50561835, 15.705952053)):
            Circle(SKETCH1_R, mode=Mode.SUBTRACT)
    extrude(amount=BOSS_EXTRUDE1_DEPTH)


solid = part.part
